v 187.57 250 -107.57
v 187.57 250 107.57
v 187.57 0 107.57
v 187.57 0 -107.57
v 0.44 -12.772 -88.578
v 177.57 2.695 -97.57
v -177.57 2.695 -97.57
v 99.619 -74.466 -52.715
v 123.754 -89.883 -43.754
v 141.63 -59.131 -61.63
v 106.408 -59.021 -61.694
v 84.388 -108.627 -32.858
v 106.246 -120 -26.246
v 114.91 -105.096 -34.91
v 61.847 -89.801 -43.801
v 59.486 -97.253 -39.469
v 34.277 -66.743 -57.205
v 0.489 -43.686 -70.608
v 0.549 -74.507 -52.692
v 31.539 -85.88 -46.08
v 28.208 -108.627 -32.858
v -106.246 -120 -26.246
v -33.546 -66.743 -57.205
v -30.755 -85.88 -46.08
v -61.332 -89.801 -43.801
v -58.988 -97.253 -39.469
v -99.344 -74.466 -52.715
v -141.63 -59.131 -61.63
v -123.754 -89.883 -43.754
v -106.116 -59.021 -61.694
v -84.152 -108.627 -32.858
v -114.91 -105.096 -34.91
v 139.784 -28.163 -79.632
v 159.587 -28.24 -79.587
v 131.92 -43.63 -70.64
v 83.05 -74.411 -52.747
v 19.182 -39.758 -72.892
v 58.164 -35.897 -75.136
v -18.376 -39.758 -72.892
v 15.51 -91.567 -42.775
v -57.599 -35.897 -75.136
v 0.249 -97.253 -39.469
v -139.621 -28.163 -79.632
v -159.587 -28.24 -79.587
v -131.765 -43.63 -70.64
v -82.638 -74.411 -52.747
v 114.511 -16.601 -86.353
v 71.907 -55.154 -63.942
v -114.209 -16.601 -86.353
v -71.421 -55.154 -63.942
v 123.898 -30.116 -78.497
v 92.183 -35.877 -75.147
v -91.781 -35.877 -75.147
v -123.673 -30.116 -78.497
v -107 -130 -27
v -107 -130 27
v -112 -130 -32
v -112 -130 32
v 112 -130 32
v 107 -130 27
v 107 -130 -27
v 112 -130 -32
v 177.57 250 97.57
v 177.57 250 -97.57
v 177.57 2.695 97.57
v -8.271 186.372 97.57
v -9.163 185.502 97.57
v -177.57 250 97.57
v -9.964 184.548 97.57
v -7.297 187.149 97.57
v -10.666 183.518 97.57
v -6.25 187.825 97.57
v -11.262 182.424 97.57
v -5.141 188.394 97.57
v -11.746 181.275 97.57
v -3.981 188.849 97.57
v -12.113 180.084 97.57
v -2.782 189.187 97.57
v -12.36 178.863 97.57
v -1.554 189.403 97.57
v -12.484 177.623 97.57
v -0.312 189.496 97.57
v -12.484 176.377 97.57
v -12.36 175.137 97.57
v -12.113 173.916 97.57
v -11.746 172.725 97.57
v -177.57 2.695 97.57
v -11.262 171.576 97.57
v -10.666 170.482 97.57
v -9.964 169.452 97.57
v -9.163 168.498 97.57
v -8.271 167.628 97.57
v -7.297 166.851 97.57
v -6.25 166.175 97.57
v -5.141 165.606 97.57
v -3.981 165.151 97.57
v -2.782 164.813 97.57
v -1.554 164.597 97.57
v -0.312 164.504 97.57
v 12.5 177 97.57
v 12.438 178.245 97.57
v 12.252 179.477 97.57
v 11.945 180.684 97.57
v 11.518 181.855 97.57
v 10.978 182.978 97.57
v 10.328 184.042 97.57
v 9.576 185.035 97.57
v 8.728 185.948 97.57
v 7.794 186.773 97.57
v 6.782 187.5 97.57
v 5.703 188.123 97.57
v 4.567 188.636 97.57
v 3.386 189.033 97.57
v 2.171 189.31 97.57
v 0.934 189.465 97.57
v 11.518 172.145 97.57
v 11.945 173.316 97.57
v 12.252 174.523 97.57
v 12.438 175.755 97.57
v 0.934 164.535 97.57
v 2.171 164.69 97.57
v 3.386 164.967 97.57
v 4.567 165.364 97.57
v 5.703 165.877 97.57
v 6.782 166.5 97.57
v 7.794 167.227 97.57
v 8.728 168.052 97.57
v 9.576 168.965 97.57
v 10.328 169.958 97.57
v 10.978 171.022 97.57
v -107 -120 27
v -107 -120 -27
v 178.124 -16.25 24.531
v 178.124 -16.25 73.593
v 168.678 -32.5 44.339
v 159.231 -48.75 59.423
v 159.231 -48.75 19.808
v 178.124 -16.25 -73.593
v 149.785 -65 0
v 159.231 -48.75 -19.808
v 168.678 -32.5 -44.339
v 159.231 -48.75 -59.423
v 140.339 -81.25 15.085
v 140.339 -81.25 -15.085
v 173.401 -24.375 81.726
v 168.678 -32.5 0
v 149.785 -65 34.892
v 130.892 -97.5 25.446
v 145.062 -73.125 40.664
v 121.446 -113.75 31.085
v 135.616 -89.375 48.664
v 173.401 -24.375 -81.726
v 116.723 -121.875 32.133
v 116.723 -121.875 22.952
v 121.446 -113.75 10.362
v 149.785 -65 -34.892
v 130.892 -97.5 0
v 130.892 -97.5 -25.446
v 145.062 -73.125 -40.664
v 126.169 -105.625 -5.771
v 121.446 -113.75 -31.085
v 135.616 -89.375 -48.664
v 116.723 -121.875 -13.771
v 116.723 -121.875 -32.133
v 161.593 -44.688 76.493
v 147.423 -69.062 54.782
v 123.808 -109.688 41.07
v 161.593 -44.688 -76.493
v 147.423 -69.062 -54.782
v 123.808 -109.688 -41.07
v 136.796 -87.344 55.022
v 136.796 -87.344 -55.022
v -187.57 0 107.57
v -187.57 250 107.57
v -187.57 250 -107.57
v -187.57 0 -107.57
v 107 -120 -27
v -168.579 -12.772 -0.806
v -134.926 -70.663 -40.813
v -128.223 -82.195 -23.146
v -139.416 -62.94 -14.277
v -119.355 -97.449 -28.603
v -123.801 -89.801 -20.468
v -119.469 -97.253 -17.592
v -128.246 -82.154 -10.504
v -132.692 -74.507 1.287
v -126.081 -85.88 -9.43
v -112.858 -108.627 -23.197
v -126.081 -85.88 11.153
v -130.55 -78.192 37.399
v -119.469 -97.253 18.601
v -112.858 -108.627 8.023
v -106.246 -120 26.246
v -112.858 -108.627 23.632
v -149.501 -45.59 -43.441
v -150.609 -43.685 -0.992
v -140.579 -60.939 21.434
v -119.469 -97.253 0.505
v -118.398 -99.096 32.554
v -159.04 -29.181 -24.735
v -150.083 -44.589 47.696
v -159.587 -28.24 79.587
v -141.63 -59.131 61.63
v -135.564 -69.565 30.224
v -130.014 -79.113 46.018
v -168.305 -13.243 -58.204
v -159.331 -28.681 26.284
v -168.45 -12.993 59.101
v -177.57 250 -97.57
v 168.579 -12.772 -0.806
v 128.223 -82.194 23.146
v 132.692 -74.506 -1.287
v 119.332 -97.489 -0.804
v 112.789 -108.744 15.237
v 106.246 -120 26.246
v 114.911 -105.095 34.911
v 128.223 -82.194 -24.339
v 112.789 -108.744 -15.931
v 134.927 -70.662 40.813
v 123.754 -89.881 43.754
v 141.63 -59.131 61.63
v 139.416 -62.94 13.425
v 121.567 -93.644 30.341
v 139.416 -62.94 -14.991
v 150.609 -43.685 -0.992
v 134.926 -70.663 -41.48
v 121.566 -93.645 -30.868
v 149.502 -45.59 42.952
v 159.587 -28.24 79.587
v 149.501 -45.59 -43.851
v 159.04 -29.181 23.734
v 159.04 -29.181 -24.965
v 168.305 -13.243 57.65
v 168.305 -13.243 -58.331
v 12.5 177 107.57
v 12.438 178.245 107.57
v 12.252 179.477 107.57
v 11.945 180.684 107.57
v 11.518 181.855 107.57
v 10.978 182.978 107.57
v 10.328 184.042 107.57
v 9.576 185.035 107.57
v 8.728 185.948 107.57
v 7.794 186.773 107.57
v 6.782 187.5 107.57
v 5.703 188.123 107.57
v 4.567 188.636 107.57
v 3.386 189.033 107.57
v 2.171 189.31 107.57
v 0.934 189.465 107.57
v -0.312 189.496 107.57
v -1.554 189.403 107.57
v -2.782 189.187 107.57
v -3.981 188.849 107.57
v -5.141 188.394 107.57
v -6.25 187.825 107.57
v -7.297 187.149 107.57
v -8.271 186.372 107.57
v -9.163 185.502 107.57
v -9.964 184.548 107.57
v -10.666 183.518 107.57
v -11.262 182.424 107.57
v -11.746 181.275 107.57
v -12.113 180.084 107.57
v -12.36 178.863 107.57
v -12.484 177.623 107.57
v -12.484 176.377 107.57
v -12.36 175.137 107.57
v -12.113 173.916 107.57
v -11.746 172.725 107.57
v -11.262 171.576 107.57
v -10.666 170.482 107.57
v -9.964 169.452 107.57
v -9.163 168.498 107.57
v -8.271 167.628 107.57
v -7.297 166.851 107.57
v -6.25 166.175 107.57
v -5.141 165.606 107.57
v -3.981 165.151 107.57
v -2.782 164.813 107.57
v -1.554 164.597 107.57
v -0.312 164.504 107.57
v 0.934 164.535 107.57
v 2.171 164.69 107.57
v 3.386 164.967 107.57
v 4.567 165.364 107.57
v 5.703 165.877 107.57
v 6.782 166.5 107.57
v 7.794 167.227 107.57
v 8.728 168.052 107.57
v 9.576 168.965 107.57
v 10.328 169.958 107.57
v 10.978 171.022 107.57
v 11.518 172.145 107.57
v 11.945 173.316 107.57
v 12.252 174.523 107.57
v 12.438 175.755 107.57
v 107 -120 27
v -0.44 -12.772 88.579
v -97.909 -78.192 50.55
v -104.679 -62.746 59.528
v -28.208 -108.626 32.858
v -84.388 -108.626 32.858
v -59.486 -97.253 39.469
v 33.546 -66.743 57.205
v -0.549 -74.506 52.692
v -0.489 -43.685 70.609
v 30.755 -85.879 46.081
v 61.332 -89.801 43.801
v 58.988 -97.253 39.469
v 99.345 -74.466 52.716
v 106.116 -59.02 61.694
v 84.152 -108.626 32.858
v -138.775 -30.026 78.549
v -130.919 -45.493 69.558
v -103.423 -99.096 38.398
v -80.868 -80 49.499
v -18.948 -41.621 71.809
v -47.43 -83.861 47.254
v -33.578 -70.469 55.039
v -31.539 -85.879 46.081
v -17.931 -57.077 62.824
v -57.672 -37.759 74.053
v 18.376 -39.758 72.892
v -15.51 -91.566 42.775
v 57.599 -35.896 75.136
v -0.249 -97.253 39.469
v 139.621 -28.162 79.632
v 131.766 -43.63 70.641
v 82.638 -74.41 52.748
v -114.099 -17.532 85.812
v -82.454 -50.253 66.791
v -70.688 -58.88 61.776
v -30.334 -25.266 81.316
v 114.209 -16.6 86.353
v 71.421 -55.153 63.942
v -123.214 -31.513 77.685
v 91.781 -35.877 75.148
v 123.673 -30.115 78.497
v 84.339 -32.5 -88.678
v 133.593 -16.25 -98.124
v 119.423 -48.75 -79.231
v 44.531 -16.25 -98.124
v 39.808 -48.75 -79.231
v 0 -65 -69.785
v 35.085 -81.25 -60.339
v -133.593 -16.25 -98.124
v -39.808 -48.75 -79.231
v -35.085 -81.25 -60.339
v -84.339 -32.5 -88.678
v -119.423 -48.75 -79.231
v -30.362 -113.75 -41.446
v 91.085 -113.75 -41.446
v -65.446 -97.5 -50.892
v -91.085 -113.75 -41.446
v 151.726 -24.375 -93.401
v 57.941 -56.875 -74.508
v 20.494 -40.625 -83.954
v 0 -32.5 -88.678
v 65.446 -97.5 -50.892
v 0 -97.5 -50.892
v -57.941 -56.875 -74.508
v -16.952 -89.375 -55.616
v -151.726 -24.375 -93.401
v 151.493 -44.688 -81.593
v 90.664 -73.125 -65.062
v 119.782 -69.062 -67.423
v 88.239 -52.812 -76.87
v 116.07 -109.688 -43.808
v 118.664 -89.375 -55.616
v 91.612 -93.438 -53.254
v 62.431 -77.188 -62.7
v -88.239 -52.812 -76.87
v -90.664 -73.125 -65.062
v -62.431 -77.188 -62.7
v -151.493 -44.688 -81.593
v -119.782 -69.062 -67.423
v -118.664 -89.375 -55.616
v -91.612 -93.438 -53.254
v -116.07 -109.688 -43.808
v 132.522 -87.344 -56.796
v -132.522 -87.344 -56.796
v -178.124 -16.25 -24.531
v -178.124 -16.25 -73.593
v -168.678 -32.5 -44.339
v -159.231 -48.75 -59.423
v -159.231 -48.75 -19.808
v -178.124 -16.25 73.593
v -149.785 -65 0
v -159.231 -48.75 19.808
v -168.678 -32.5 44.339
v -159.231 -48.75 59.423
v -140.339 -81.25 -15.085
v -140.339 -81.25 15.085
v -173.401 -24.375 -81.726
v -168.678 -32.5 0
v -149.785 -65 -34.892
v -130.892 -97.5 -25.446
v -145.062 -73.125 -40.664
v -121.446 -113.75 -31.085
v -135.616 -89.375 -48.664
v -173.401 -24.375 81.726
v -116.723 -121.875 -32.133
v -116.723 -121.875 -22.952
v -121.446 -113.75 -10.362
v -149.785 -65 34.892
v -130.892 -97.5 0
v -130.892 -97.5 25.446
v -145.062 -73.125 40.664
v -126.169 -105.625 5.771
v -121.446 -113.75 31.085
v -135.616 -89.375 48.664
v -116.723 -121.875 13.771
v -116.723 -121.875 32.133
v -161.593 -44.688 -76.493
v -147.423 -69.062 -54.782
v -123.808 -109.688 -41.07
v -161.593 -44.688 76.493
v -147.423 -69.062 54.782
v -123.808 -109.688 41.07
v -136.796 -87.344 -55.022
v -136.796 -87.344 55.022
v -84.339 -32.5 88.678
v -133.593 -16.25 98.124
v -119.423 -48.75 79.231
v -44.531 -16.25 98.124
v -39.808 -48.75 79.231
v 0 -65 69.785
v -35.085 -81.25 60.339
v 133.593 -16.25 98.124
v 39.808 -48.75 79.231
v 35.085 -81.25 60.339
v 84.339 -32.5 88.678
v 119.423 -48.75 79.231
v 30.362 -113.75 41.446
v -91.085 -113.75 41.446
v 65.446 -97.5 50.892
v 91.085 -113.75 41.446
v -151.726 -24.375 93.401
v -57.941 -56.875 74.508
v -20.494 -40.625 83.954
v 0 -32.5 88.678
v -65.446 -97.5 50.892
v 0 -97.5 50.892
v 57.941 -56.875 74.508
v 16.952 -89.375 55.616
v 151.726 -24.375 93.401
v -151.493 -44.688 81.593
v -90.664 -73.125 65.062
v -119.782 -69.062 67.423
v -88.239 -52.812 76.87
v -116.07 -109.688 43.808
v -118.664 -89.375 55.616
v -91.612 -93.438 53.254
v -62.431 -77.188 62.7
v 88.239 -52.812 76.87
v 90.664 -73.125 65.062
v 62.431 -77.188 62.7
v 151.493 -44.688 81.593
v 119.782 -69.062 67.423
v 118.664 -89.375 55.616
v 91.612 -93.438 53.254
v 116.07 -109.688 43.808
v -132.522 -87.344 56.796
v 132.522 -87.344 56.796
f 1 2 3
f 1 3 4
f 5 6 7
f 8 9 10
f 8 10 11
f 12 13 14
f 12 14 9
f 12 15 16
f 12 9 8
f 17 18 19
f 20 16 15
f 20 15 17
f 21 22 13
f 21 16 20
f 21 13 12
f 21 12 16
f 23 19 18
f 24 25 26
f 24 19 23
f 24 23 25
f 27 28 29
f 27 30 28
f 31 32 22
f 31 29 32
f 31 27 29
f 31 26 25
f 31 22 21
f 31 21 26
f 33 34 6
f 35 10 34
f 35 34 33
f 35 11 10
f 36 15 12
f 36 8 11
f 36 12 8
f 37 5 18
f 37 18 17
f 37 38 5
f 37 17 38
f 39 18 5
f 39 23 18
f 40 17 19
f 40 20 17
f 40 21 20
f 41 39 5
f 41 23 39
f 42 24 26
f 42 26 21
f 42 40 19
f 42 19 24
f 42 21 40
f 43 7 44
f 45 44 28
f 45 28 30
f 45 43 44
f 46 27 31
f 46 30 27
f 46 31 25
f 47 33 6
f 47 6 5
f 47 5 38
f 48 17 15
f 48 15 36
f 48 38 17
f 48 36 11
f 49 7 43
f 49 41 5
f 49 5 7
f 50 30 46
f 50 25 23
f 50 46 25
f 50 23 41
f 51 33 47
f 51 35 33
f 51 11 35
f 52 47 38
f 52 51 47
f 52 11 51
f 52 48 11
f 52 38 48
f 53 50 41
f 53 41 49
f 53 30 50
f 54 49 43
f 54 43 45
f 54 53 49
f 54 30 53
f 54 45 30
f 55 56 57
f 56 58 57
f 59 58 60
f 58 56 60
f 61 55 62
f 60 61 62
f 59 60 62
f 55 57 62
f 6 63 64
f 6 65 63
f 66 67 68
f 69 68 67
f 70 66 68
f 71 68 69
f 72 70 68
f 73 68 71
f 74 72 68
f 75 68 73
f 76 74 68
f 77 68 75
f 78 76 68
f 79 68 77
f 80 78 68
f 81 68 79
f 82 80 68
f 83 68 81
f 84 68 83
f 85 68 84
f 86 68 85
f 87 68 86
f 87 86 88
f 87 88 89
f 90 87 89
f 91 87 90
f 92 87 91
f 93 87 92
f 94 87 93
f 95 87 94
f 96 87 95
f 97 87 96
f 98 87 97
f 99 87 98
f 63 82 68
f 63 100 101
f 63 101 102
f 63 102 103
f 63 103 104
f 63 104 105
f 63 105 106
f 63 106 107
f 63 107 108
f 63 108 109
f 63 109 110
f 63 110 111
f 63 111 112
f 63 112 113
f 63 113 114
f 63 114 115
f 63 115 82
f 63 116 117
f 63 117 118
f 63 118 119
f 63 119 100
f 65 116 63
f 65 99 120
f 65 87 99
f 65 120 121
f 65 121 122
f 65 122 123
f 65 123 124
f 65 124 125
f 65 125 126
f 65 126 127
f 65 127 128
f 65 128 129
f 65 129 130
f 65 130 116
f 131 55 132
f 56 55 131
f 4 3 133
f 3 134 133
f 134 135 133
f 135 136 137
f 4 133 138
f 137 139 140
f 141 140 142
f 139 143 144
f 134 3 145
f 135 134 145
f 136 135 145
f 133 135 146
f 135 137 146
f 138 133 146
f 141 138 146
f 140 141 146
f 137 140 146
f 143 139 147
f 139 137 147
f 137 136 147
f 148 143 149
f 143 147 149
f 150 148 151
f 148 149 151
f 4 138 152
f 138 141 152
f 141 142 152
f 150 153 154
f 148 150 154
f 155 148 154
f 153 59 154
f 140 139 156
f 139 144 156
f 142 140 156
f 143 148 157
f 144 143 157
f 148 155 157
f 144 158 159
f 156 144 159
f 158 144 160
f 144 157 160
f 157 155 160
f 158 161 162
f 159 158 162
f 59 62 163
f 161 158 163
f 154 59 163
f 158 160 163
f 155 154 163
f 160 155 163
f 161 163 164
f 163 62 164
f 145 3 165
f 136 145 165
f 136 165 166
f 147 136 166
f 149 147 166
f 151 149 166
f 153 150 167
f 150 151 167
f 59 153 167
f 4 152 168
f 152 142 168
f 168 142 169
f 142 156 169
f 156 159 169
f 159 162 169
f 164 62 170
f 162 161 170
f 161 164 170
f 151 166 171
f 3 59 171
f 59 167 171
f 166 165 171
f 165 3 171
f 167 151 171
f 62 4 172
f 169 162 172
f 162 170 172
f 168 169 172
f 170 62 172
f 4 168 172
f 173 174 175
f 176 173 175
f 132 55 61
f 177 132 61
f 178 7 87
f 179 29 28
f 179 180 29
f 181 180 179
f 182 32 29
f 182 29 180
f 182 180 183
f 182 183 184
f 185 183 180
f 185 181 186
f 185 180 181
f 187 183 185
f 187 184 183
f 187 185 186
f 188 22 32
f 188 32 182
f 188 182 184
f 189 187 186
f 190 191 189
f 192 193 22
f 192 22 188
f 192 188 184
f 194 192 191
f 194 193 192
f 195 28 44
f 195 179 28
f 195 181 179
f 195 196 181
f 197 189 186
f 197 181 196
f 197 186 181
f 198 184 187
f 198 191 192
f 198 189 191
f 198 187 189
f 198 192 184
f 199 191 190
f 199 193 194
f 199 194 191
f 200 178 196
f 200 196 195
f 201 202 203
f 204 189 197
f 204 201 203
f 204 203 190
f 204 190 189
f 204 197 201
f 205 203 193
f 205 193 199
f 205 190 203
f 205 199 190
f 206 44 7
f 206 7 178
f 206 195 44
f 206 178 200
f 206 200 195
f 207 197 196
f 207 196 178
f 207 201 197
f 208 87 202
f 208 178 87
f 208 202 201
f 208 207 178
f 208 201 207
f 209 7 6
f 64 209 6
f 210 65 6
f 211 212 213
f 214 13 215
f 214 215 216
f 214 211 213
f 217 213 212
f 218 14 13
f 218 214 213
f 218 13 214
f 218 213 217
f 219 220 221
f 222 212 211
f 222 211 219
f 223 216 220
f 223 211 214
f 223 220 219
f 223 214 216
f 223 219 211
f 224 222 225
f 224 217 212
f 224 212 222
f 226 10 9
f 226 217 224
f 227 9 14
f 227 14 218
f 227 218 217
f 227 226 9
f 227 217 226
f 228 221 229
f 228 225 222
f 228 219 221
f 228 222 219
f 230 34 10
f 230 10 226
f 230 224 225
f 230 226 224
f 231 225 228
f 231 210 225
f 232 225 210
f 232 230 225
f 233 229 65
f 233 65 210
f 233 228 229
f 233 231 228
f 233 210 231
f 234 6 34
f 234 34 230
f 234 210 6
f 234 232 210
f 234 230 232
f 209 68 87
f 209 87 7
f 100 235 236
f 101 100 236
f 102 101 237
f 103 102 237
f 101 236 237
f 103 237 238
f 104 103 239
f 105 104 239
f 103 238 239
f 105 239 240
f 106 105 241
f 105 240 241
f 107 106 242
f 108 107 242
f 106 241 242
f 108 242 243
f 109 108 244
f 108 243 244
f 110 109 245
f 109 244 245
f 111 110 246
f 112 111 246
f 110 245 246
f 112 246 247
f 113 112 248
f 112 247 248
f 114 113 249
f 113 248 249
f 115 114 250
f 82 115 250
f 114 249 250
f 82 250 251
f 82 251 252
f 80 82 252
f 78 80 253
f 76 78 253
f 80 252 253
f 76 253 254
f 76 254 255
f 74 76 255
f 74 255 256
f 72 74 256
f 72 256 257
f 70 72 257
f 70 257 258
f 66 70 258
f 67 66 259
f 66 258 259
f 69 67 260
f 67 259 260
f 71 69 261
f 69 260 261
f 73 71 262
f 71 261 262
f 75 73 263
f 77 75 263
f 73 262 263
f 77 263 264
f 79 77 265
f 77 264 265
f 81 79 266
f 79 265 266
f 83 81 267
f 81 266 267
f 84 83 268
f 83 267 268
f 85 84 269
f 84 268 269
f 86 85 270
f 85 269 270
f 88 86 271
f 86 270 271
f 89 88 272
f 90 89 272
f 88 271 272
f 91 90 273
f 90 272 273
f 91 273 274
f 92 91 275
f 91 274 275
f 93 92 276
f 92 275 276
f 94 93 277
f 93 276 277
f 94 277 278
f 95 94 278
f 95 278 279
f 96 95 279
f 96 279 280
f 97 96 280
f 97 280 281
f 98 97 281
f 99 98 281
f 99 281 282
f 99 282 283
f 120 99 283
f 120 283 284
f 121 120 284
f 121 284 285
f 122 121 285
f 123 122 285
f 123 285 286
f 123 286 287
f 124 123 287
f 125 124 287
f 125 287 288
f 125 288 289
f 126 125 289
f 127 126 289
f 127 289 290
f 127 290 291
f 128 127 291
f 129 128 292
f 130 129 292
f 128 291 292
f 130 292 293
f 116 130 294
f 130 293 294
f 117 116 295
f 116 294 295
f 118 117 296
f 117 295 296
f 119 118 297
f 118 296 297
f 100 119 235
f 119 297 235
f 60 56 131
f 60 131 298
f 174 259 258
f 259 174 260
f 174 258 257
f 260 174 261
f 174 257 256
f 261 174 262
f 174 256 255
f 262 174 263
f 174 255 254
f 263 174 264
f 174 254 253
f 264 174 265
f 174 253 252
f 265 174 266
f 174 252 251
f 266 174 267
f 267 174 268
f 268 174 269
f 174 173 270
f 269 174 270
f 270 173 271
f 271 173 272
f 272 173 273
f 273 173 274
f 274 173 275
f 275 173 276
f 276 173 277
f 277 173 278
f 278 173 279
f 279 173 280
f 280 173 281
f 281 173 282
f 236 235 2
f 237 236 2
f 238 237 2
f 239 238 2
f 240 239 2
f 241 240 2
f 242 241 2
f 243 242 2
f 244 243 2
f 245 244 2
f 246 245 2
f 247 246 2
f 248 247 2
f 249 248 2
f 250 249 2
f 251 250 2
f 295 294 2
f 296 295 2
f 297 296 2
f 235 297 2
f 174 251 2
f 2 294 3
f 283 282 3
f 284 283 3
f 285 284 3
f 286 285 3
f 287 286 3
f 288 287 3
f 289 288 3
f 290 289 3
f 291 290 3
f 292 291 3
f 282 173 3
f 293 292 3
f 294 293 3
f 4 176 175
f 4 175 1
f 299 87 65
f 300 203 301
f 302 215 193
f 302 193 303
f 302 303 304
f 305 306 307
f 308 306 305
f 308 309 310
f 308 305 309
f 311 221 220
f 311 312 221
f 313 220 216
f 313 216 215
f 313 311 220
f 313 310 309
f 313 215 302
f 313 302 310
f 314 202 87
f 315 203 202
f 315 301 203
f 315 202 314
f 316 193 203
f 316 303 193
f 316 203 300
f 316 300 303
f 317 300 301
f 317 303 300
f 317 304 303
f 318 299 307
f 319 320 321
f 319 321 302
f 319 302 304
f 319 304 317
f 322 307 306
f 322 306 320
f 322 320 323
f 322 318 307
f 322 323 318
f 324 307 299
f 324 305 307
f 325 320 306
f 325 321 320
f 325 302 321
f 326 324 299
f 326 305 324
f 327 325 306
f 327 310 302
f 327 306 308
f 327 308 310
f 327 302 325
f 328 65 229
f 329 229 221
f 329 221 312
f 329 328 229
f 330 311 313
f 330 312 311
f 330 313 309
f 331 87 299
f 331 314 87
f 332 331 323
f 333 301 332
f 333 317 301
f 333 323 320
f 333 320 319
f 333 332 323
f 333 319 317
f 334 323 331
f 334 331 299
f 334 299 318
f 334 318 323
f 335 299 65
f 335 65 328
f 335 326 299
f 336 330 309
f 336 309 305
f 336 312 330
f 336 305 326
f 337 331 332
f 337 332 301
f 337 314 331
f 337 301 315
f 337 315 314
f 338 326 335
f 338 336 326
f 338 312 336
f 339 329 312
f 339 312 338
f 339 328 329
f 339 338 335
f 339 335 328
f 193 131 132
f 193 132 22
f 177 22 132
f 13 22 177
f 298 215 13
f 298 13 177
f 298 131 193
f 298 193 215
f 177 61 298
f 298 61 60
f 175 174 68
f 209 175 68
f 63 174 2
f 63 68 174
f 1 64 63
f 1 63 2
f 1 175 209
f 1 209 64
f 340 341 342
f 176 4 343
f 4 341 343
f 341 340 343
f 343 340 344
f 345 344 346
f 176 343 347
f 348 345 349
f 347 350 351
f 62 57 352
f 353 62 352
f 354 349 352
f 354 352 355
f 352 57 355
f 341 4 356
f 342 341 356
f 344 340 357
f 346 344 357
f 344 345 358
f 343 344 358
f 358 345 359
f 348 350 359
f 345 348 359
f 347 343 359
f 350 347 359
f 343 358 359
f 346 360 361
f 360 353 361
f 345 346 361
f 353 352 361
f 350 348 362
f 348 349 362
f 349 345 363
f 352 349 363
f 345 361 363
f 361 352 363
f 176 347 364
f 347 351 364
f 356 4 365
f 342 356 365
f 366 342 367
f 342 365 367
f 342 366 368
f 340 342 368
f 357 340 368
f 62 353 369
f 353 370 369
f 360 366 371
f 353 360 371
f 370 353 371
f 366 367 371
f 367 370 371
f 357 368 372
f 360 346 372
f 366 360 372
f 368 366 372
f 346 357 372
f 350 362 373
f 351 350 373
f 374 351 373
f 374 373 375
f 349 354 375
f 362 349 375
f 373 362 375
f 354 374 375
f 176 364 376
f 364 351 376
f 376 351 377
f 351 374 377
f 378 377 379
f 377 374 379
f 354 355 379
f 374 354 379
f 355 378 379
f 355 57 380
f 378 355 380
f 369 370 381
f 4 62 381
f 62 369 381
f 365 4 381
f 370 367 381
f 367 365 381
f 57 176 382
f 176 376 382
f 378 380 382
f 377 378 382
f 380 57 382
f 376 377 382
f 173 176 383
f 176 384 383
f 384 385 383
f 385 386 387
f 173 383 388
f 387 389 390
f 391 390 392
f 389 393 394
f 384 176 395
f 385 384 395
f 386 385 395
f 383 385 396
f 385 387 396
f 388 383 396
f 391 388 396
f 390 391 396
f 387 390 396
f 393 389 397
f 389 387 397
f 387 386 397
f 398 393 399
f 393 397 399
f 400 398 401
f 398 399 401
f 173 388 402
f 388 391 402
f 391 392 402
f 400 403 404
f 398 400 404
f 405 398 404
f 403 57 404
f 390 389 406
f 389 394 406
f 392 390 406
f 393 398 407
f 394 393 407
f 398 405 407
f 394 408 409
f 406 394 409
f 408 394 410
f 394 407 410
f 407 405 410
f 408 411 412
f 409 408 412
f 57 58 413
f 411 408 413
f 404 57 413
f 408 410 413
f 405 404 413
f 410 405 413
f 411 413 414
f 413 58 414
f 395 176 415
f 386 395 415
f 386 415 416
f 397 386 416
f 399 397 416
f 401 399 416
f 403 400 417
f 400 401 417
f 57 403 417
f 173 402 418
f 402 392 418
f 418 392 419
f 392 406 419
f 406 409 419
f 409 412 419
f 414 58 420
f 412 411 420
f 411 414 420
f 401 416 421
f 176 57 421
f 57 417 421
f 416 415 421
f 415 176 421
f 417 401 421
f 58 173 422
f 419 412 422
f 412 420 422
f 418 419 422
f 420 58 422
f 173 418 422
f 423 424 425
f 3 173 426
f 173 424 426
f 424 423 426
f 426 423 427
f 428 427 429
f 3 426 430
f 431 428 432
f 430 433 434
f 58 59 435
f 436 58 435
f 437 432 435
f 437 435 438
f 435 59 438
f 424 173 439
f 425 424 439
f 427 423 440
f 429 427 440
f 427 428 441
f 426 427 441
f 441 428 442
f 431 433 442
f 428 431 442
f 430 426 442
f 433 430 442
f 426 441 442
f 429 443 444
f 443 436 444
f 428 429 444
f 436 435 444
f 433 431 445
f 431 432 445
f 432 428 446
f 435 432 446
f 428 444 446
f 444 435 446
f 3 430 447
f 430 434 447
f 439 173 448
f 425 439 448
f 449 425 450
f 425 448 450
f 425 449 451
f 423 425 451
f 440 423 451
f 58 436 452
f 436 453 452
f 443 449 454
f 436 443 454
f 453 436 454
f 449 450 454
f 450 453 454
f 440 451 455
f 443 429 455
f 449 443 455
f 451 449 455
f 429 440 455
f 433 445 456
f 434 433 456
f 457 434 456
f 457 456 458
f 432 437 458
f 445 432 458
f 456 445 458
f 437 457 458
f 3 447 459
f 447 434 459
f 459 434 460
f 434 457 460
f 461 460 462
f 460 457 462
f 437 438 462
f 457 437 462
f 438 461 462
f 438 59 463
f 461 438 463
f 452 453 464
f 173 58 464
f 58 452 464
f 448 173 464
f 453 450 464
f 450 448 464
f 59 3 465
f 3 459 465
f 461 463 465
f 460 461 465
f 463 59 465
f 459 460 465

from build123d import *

# Parameters (mm, degrees)
SKETCH_1_W          = 375.14
SKETCH_1_H          = 215.14
EXTRUDE_1_DEPTH     = 250
SHELL_1_T           = -10
SKETCH_5_R          = 12.5
CUT_EXTRUDE_1_DEPTH = 10
SKETCH_6_W          = 214
SKETCH_6_H          = 54
CUT_EXTRUDE_2_DEPTH = 10


with BuildPart() as part:
    # 草图1 → 凸台-拉伸1 (new body)
    with BuildSketch(Plane(origin=(0, 0, 0), x_dir=(1, 0, 0), z_dir=(0, 1, 0))):
        Rectangle(SKETCH_1_W, SKETCH_1_H)
    extrude(amount=EXTRUDE_1_DEPTH)

    # 草图4 → section 1 of loft_1
    with BuildSketch(Plane(origin=(0, -130, 0), x_dir=(1, 0, 0), z_dir=(0, 1, 0)), mode=Mode.PRIVATE) as loft_1_s1:
        with BuildLine():
            Line((-112, 32), (112, 32))
            Line((112, 32), (112, -32))
            Line((112, -32), (-112, -32))
            Line((-112, -32), (-112, 32))
        make_face()
    # loft from a face of the part (loft_1)
    loft([part.faces().sort_by_distance((0, 0, 0))[0], loft_1_s1.sketch])

    # 抽壳1
    shell_1_openings = [part.faces().sort_by_distance(p)[0] for p in [
        (0, 250, 0),
    ]]
    offset(amount=SHELL_1_T, openings=shell_1_openings, kind=Kind.INTERSECTION)

    # 草图5 → 切除-拉伸1 (cut)
    with BuildSketch(Plane.XY.offset(107.57)):
        with Locations((0, 177)):
            Circle(SKETCH_5_R)
    extrude(amount=-CUT_EXTRUDE_1_DEPTH, mode=Mode.SUBTRACT)

    # 草图6 → 切除-拉伸2 (cut)
    with BuildSketch(Plane.XZ.offset(130)):
        Rectangle(SKETCH_6_W, SKETCH_6_H)
    extrude(amount=-CUT_EXTRUDE_2_DEPTH, mode=Mode.SUBTRACT)


solid = part.part
